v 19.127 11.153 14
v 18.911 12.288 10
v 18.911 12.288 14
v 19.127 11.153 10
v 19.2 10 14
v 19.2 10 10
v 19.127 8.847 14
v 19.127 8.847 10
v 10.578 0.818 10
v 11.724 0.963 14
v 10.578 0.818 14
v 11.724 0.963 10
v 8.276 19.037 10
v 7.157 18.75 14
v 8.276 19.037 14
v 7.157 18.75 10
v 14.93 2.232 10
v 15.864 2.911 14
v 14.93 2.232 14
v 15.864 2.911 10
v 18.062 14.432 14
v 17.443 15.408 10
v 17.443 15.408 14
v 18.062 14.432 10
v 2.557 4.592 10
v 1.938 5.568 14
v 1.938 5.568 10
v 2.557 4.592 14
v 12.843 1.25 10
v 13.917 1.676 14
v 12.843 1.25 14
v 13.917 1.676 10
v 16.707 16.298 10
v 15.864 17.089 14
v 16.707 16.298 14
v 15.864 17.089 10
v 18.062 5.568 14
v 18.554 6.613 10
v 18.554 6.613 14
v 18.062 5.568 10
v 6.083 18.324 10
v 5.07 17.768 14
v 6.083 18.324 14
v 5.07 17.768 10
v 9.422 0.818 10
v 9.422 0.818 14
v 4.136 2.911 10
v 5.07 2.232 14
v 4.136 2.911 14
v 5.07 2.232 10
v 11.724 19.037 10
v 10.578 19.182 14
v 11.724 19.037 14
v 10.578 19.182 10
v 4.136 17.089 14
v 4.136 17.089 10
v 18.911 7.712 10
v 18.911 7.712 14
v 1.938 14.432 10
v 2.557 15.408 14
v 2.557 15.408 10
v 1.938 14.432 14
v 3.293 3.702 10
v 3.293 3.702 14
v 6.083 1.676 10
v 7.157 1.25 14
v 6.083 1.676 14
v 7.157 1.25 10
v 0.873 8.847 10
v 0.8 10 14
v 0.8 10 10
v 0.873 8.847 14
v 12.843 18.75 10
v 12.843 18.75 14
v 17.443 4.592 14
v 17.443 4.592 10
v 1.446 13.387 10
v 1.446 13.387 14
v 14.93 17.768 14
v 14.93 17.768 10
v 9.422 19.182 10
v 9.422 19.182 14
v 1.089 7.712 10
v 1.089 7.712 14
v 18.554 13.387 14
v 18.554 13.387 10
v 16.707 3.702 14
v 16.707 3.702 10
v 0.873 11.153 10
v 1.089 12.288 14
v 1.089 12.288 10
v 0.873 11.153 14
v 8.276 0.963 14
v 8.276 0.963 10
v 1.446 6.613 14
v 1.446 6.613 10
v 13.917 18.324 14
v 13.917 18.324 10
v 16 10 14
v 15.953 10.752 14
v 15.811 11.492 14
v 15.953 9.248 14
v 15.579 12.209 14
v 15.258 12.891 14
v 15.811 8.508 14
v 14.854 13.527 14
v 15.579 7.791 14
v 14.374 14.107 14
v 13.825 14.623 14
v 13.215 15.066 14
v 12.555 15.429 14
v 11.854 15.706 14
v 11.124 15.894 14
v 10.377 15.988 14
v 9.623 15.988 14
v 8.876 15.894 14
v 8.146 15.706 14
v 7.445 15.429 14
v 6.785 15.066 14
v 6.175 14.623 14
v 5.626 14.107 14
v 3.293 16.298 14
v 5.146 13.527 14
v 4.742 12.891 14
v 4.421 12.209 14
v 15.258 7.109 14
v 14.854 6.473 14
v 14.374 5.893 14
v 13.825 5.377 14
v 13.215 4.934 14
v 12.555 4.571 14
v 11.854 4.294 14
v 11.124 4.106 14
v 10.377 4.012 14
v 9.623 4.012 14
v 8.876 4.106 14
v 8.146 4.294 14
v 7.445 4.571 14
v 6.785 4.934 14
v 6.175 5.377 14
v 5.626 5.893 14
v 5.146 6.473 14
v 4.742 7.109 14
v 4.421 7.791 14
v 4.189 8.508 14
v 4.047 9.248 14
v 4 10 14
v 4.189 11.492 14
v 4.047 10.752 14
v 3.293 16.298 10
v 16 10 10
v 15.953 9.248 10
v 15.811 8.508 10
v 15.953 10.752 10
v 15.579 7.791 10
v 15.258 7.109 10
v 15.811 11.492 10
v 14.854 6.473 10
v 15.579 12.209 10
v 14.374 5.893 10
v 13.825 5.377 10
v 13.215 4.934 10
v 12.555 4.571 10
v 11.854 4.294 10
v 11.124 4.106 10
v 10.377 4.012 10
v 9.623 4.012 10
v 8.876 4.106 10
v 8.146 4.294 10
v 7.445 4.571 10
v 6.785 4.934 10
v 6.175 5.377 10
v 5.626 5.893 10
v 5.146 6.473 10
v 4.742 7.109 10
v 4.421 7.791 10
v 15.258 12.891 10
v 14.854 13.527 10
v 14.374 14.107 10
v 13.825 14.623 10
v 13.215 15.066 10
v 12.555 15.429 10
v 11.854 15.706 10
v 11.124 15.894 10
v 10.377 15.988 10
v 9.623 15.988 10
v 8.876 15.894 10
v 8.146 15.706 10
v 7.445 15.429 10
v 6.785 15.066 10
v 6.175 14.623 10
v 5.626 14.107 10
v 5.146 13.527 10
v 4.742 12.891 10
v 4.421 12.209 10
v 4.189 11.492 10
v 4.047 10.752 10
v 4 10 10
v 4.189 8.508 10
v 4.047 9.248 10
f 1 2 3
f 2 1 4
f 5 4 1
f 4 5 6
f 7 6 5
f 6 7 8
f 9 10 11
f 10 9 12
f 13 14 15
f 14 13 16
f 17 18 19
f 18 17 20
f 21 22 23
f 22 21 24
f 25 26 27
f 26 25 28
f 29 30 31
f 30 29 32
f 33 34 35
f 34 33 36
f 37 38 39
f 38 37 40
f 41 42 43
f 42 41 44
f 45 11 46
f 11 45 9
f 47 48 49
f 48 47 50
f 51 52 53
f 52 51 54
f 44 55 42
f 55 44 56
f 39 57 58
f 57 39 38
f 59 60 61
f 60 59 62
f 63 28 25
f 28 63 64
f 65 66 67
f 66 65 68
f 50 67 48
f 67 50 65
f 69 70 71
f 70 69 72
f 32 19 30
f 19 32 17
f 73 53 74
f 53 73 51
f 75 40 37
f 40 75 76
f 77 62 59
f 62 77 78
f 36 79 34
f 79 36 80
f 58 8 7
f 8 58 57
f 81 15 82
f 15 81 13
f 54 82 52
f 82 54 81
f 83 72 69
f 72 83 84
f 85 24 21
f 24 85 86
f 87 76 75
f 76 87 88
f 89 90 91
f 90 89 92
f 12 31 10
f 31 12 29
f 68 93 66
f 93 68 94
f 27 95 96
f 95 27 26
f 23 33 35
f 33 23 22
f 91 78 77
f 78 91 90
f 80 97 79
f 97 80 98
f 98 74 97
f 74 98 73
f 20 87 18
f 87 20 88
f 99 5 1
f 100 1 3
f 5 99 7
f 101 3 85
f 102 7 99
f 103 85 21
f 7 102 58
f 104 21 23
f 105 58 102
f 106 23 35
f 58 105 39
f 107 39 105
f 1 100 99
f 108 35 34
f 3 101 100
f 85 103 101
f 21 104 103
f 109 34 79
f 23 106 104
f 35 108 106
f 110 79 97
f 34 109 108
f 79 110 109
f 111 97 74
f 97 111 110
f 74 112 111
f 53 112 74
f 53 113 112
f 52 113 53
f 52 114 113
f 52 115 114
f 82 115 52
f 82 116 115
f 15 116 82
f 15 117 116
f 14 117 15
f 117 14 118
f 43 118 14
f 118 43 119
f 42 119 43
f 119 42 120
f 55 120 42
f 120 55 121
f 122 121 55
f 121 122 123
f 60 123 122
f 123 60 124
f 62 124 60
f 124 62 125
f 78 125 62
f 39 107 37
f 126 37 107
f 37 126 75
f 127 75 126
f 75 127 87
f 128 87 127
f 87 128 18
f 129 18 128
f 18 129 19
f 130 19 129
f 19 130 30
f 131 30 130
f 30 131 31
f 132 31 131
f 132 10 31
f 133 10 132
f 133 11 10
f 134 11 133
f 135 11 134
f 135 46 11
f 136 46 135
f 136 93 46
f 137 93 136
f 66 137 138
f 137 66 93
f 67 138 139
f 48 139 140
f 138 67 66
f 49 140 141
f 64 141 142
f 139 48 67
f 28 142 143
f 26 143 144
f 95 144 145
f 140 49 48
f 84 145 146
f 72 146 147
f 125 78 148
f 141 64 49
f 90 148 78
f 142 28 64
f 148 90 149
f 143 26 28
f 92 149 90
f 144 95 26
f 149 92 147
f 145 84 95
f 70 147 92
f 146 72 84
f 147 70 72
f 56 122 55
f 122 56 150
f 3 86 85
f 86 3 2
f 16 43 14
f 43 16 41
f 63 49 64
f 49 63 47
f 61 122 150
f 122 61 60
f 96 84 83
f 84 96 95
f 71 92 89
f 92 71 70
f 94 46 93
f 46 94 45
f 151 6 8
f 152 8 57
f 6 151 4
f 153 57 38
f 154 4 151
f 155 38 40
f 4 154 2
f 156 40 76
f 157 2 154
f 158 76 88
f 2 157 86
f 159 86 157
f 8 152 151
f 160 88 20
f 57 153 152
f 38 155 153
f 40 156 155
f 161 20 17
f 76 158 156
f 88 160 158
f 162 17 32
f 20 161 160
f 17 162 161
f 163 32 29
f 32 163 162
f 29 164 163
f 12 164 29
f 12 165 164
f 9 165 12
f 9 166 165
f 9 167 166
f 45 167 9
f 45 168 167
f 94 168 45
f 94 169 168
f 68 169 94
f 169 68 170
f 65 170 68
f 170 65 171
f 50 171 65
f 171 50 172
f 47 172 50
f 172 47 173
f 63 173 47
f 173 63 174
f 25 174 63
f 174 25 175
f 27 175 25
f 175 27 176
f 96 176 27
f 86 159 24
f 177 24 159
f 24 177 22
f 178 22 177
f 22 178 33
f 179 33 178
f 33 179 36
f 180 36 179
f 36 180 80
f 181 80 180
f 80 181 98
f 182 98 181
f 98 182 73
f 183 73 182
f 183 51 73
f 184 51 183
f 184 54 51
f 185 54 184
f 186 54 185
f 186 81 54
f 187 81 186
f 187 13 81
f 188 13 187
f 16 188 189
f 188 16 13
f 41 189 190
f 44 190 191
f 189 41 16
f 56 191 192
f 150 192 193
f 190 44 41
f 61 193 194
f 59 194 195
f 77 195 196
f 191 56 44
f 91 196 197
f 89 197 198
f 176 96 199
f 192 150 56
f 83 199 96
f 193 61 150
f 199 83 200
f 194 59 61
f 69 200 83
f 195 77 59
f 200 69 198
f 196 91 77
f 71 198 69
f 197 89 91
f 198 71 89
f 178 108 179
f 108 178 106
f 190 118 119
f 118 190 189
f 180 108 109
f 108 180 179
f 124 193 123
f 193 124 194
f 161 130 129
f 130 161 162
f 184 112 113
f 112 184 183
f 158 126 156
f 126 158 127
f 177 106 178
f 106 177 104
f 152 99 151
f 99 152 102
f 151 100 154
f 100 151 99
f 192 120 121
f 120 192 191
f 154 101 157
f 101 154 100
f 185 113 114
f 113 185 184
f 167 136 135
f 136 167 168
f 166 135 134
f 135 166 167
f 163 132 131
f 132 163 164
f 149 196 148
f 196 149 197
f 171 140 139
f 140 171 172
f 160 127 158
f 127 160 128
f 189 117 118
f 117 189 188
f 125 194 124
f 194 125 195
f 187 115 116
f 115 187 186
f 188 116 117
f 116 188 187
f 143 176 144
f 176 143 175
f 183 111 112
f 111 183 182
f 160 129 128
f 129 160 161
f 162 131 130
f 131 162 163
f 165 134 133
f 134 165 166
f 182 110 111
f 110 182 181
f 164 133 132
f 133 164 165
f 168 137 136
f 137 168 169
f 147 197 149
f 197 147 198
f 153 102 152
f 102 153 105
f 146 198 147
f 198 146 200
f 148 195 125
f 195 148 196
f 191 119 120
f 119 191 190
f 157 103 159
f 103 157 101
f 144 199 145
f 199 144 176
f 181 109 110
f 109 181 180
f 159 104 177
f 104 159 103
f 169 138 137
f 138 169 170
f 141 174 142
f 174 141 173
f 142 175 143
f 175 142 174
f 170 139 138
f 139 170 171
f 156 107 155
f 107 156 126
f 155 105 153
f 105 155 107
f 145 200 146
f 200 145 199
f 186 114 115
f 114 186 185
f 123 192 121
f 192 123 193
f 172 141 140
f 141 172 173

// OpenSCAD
// file: hardware_bearing_6701/3dpr.scad
$fn = 50;


difference() {
	union() {
		translate(v = [0, 0, 0]) {
			rotate(a = [0, 0, 0]) {
				cylinder(h = 4, r = 9.2000000000);
			}
		}
	}
	union() {
		translate(v = [0, 0, 0]) {
			rotate(a = [0, 0, 0]) {
				cylinder(h = 4, r = 6.0000000000);
			}
		}
	}
}
// main file
translate([10,10,10]){
    include <hardware_bearing_6701/3dpr.scad>
}
